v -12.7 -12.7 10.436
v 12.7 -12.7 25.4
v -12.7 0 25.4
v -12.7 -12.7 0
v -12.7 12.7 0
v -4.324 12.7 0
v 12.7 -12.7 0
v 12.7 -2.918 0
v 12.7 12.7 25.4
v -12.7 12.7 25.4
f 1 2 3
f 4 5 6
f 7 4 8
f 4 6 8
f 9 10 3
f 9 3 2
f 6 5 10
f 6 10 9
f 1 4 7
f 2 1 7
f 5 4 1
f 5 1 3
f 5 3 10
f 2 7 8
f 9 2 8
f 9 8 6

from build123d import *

# Parameters (mm, degrees)
F0_W      = 25.4
F0_H      = 25.4
F1_DEPTH  = 25.4
F5_W      = 87.4159298837
F5_H      = 133.6338296533
F6_DEPTH  = 25.4
F9_W      = 100.1058854163
F9_H      = 223.7386330962
F10_DEPTH = 25.4


with BuildPart() as f1:
    # F0 (on Top) → F1 (new body)
    with BuildSketch(Plane.XY):
        Rectangle(F0_W, F0_H)
    extrude(amount=F1_DEPTH)

    # F5 (on 3pt) → F6 (cut)
    with BuildSketch(Plane(origin=(-7.0819495099, -14.1638990198, 12.0212404911), x_dir=(-0.9344077554, 0.2715776833, -0.2304944873), z_dir=(0.3562052031, 0.7124104062, -0.6046397824))):
        with Locations((19.7420697659, 46.980433166)):
            Rectangle(F5_W, F5_H)
    extrude(amount=-F6_DEPTH, mode=Mode.SUBTRACT)

    # F9 (on 3pt) → F10 (cut)
    with BuildSketch(Plane(origin=(3.6094875517, 3.9343350679, -2.4191651376), x_dir=(-0.7879237292, 0.5245449158, -0.3225350031), z_dir=(0.6157728453, 0.6711913157, -0.4127057314))):
        with Locations((-17.2750819474, 77.5100886822)):
            Rectangle(F9_W, F9_H)
    extrude(amount=F10_DEPTH, mode=Mode.SUBTRACT)


solid = f1.part
